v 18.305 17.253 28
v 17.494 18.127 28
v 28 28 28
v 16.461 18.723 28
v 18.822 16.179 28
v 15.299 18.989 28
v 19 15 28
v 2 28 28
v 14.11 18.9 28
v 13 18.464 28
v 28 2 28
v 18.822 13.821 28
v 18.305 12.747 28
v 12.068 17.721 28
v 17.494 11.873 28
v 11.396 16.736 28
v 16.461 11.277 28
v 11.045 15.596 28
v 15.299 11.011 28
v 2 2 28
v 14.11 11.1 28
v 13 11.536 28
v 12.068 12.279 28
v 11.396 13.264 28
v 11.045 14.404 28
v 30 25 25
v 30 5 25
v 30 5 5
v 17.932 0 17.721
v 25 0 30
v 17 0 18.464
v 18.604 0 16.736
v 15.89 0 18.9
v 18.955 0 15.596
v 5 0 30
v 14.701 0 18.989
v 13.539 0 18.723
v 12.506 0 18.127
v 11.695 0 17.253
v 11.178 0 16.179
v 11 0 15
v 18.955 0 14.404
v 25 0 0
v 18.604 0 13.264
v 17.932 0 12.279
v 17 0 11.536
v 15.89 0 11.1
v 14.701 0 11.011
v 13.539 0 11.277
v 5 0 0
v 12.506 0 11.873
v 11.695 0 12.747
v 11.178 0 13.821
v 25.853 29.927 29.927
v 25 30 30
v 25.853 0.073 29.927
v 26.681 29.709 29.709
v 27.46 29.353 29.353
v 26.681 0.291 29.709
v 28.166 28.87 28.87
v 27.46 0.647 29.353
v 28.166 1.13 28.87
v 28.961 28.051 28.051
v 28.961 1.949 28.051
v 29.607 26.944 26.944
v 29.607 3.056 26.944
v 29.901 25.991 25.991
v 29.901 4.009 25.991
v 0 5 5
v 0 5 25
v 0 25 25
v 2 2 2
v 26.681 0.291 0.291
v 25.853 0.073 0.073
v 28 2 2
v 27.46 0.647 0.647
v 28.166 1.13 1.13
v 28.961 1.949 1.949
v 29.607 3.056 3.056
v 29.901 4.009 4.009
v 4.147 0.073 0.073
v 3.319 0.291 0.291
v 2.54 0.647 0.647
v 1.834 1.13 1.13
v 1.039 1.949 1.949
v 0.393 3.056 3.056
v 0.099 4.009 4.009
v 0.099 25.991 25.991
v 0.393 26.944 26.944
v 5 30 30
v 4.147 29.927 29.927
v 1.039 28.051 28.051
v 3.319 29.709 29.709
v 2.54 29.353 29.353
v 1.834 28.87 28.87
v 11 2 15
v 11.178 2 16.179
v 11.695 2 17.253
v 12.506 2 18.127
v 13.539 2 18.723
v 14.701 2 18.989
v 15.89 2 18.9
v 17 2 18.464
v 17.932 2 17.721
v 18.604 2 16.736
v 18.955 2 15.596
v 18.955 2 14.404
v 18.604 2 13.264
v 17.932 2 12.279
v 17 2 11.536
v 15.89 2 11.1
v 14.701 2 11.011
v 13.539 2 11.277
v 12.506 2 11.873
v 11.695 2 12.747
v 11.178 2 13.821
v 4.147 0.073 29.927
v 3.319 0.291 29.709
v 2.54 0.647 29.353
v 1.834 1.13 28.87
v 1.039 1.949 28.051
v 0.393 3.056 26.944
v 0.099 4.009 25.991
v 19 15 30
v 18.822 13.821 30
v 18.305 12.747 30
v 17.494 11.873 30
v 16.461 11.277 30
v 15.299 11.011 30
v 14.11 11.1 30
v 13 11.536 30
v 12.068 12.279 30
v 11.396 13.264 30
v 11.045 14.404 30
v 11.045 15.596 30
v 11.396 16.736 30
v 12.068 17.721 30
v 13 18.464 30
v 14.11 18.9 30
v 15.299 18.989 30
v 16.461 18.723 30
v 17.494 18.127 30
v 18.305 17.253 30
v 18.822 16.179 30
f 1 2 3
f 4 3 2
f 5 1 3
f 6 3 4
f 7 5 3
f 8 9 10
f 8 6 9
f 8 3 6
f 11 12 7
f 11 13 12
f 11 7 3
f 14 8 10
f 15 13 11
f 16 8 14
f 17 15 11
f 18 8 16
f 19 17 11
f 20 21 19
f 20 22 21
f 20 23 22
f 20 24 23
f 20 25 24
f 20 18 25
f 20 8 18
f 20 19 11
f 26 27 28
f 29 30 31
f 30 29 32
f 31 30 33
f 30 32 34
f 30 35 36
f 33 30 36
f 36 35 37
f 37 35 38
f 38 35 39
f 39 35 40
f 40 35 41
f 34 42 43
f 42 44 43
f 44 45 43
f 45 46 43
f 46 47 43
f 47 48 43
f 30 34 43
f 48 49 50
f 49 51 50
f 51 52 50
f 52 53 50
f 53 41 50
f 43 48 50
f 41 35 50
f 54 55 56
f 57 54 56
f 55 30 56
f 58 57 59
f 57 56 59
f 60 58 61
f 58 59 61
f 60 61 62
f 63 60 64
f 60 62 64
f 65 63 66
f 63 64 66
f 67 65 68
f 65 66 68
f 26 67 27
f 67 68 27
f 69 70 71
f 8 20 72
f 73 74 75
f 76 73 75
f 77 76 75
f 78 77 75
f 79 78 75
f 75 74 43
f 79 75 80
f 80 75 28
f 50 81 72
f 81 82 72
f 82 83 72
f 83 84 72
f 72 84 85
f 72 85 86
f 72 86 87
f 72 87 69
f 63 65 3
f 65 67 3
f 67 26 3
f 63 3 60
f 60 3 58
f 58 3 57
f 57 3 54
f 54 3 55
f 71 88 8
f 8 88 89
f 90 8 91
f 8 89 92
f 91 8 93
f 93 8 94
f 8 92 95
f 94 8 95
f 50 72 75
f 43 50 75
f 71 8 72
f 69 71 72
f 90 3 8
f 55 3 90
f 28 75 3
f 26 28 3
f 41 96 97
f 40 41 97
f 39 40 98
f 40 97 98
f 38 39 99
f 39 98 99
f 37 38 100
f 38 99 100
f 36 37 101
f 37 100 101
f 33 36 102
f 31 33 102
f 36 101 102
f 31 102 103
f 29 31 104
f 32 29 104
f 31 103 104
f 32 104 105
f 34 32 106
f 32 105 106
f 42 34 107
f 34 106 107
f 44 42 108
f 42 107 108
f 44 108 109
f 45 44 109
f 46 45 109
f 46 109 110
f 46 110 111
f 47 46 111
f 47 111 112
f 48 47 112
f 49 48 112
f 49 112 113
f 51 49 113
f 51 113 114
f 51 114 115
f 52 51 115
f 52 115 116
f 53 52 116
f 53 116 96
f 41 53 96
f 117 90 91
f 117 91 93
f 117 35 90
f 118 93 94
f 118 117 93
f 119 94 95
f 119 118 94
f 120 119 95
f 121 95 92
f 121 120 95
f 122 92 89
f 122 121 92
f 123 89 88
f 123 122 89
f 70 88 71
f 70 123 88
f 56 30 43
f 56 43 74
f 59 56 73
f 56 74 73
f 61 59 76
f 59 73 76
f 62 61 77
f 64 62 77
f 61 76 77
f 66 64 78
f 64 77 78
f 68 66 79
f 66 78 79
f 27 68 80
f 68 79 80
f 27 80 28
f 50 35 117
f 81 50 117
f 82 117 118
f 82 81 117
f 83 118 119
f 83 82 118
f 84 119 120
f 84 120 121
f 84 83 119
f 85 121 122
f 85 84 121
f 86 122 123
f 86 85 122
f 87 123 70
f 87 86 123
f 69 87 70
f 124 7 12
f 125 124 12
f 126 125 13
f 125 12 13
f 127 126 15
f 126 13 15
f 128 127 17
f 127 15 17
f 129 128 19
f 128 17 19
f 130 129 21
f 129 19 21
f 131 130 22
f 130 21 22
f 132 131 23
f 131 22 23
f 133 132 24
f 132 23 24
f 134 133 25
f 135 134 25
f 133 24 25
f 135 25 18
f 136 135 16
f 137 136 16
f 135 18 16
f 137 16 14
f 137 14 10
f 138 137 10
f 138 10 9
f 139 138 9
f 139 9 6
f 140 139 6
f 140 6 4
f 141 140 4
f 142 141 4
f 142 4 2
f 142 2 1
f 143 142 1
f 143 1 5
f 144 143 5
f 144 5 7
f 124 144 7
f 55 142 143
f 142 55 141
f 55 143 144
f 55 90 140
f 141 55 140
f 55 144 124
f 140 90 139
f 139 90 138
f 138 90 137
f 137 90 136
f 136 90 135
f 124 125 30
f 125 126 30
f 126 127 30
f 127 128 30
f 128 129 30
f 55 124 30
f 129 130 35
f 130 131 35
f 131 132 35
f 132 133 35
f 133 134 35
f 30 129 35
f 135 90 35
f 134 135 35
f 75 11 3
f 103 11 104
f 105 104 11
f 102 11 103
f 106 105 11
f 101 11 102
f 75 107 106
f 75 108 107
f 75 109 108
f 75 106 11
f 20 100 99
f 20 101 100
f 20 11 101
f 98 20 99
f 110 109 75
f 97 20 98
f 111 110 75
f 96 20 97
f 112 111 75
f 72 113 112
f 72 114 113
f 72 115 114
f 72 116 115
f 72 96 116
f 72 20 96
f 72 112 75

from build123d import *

# Parameters (mm, degrees)
F1_DEPTH = 30
F2_T     = -2
F3_R     = 5
F4_R     = 4
F5_DEPTH = 2.001
F6_R     = 4
F7_DEPTH = 2.001


with BuildPart() as f1:
    # F0 (on Right) → F1 (new body)
    with BuildSketch(Plane.YZ):
        Polygon((0, 30), (0, 0), (30, 30), align=None)
    extrude(amount=F1_DEPTH)

    # F2
    f2_openings = [f1.faces().sort_by_distance(p)[0] for p in [
        (15, 15, 15),
    ]]
    offset(amount=F2_T, openings=f2_openings)

    # F3
    f3_edges = [f1.edges().sort_by_distance(p)[0] for p in [
        (30, 0, 15),
        (30, 15, 30),
        (0, 0, 15),
        (0, 15, 30),
    ]]
    fillet(f3_edges, radius=F3_R)

    # F4 (on face) → F5 (cut, through all)
    with BuildSketch(Plane(origin=(0, 0, 28), x_dir=(1, 0, 0), z_dir=(0, 0, -1))):
        with Locations((15, -15)):
            Circle(F4_R)
    extrude(amount=-F5_DEPTH, mode=Mode.SUBTRACT)

    # F6 (on face) → F7 (cut, through all)
    with BuildSketch(Plane(origin=(0, 2, 0), x_dir=(-1, 0, 0), z_dir=(0, 1, 0))):
        with Locations((-15, 15)):
            Circle(F6_R)
    extrude(amount=-F7_DEPTH, mode=Mode.SUBTRACT)


solid = f1.part
